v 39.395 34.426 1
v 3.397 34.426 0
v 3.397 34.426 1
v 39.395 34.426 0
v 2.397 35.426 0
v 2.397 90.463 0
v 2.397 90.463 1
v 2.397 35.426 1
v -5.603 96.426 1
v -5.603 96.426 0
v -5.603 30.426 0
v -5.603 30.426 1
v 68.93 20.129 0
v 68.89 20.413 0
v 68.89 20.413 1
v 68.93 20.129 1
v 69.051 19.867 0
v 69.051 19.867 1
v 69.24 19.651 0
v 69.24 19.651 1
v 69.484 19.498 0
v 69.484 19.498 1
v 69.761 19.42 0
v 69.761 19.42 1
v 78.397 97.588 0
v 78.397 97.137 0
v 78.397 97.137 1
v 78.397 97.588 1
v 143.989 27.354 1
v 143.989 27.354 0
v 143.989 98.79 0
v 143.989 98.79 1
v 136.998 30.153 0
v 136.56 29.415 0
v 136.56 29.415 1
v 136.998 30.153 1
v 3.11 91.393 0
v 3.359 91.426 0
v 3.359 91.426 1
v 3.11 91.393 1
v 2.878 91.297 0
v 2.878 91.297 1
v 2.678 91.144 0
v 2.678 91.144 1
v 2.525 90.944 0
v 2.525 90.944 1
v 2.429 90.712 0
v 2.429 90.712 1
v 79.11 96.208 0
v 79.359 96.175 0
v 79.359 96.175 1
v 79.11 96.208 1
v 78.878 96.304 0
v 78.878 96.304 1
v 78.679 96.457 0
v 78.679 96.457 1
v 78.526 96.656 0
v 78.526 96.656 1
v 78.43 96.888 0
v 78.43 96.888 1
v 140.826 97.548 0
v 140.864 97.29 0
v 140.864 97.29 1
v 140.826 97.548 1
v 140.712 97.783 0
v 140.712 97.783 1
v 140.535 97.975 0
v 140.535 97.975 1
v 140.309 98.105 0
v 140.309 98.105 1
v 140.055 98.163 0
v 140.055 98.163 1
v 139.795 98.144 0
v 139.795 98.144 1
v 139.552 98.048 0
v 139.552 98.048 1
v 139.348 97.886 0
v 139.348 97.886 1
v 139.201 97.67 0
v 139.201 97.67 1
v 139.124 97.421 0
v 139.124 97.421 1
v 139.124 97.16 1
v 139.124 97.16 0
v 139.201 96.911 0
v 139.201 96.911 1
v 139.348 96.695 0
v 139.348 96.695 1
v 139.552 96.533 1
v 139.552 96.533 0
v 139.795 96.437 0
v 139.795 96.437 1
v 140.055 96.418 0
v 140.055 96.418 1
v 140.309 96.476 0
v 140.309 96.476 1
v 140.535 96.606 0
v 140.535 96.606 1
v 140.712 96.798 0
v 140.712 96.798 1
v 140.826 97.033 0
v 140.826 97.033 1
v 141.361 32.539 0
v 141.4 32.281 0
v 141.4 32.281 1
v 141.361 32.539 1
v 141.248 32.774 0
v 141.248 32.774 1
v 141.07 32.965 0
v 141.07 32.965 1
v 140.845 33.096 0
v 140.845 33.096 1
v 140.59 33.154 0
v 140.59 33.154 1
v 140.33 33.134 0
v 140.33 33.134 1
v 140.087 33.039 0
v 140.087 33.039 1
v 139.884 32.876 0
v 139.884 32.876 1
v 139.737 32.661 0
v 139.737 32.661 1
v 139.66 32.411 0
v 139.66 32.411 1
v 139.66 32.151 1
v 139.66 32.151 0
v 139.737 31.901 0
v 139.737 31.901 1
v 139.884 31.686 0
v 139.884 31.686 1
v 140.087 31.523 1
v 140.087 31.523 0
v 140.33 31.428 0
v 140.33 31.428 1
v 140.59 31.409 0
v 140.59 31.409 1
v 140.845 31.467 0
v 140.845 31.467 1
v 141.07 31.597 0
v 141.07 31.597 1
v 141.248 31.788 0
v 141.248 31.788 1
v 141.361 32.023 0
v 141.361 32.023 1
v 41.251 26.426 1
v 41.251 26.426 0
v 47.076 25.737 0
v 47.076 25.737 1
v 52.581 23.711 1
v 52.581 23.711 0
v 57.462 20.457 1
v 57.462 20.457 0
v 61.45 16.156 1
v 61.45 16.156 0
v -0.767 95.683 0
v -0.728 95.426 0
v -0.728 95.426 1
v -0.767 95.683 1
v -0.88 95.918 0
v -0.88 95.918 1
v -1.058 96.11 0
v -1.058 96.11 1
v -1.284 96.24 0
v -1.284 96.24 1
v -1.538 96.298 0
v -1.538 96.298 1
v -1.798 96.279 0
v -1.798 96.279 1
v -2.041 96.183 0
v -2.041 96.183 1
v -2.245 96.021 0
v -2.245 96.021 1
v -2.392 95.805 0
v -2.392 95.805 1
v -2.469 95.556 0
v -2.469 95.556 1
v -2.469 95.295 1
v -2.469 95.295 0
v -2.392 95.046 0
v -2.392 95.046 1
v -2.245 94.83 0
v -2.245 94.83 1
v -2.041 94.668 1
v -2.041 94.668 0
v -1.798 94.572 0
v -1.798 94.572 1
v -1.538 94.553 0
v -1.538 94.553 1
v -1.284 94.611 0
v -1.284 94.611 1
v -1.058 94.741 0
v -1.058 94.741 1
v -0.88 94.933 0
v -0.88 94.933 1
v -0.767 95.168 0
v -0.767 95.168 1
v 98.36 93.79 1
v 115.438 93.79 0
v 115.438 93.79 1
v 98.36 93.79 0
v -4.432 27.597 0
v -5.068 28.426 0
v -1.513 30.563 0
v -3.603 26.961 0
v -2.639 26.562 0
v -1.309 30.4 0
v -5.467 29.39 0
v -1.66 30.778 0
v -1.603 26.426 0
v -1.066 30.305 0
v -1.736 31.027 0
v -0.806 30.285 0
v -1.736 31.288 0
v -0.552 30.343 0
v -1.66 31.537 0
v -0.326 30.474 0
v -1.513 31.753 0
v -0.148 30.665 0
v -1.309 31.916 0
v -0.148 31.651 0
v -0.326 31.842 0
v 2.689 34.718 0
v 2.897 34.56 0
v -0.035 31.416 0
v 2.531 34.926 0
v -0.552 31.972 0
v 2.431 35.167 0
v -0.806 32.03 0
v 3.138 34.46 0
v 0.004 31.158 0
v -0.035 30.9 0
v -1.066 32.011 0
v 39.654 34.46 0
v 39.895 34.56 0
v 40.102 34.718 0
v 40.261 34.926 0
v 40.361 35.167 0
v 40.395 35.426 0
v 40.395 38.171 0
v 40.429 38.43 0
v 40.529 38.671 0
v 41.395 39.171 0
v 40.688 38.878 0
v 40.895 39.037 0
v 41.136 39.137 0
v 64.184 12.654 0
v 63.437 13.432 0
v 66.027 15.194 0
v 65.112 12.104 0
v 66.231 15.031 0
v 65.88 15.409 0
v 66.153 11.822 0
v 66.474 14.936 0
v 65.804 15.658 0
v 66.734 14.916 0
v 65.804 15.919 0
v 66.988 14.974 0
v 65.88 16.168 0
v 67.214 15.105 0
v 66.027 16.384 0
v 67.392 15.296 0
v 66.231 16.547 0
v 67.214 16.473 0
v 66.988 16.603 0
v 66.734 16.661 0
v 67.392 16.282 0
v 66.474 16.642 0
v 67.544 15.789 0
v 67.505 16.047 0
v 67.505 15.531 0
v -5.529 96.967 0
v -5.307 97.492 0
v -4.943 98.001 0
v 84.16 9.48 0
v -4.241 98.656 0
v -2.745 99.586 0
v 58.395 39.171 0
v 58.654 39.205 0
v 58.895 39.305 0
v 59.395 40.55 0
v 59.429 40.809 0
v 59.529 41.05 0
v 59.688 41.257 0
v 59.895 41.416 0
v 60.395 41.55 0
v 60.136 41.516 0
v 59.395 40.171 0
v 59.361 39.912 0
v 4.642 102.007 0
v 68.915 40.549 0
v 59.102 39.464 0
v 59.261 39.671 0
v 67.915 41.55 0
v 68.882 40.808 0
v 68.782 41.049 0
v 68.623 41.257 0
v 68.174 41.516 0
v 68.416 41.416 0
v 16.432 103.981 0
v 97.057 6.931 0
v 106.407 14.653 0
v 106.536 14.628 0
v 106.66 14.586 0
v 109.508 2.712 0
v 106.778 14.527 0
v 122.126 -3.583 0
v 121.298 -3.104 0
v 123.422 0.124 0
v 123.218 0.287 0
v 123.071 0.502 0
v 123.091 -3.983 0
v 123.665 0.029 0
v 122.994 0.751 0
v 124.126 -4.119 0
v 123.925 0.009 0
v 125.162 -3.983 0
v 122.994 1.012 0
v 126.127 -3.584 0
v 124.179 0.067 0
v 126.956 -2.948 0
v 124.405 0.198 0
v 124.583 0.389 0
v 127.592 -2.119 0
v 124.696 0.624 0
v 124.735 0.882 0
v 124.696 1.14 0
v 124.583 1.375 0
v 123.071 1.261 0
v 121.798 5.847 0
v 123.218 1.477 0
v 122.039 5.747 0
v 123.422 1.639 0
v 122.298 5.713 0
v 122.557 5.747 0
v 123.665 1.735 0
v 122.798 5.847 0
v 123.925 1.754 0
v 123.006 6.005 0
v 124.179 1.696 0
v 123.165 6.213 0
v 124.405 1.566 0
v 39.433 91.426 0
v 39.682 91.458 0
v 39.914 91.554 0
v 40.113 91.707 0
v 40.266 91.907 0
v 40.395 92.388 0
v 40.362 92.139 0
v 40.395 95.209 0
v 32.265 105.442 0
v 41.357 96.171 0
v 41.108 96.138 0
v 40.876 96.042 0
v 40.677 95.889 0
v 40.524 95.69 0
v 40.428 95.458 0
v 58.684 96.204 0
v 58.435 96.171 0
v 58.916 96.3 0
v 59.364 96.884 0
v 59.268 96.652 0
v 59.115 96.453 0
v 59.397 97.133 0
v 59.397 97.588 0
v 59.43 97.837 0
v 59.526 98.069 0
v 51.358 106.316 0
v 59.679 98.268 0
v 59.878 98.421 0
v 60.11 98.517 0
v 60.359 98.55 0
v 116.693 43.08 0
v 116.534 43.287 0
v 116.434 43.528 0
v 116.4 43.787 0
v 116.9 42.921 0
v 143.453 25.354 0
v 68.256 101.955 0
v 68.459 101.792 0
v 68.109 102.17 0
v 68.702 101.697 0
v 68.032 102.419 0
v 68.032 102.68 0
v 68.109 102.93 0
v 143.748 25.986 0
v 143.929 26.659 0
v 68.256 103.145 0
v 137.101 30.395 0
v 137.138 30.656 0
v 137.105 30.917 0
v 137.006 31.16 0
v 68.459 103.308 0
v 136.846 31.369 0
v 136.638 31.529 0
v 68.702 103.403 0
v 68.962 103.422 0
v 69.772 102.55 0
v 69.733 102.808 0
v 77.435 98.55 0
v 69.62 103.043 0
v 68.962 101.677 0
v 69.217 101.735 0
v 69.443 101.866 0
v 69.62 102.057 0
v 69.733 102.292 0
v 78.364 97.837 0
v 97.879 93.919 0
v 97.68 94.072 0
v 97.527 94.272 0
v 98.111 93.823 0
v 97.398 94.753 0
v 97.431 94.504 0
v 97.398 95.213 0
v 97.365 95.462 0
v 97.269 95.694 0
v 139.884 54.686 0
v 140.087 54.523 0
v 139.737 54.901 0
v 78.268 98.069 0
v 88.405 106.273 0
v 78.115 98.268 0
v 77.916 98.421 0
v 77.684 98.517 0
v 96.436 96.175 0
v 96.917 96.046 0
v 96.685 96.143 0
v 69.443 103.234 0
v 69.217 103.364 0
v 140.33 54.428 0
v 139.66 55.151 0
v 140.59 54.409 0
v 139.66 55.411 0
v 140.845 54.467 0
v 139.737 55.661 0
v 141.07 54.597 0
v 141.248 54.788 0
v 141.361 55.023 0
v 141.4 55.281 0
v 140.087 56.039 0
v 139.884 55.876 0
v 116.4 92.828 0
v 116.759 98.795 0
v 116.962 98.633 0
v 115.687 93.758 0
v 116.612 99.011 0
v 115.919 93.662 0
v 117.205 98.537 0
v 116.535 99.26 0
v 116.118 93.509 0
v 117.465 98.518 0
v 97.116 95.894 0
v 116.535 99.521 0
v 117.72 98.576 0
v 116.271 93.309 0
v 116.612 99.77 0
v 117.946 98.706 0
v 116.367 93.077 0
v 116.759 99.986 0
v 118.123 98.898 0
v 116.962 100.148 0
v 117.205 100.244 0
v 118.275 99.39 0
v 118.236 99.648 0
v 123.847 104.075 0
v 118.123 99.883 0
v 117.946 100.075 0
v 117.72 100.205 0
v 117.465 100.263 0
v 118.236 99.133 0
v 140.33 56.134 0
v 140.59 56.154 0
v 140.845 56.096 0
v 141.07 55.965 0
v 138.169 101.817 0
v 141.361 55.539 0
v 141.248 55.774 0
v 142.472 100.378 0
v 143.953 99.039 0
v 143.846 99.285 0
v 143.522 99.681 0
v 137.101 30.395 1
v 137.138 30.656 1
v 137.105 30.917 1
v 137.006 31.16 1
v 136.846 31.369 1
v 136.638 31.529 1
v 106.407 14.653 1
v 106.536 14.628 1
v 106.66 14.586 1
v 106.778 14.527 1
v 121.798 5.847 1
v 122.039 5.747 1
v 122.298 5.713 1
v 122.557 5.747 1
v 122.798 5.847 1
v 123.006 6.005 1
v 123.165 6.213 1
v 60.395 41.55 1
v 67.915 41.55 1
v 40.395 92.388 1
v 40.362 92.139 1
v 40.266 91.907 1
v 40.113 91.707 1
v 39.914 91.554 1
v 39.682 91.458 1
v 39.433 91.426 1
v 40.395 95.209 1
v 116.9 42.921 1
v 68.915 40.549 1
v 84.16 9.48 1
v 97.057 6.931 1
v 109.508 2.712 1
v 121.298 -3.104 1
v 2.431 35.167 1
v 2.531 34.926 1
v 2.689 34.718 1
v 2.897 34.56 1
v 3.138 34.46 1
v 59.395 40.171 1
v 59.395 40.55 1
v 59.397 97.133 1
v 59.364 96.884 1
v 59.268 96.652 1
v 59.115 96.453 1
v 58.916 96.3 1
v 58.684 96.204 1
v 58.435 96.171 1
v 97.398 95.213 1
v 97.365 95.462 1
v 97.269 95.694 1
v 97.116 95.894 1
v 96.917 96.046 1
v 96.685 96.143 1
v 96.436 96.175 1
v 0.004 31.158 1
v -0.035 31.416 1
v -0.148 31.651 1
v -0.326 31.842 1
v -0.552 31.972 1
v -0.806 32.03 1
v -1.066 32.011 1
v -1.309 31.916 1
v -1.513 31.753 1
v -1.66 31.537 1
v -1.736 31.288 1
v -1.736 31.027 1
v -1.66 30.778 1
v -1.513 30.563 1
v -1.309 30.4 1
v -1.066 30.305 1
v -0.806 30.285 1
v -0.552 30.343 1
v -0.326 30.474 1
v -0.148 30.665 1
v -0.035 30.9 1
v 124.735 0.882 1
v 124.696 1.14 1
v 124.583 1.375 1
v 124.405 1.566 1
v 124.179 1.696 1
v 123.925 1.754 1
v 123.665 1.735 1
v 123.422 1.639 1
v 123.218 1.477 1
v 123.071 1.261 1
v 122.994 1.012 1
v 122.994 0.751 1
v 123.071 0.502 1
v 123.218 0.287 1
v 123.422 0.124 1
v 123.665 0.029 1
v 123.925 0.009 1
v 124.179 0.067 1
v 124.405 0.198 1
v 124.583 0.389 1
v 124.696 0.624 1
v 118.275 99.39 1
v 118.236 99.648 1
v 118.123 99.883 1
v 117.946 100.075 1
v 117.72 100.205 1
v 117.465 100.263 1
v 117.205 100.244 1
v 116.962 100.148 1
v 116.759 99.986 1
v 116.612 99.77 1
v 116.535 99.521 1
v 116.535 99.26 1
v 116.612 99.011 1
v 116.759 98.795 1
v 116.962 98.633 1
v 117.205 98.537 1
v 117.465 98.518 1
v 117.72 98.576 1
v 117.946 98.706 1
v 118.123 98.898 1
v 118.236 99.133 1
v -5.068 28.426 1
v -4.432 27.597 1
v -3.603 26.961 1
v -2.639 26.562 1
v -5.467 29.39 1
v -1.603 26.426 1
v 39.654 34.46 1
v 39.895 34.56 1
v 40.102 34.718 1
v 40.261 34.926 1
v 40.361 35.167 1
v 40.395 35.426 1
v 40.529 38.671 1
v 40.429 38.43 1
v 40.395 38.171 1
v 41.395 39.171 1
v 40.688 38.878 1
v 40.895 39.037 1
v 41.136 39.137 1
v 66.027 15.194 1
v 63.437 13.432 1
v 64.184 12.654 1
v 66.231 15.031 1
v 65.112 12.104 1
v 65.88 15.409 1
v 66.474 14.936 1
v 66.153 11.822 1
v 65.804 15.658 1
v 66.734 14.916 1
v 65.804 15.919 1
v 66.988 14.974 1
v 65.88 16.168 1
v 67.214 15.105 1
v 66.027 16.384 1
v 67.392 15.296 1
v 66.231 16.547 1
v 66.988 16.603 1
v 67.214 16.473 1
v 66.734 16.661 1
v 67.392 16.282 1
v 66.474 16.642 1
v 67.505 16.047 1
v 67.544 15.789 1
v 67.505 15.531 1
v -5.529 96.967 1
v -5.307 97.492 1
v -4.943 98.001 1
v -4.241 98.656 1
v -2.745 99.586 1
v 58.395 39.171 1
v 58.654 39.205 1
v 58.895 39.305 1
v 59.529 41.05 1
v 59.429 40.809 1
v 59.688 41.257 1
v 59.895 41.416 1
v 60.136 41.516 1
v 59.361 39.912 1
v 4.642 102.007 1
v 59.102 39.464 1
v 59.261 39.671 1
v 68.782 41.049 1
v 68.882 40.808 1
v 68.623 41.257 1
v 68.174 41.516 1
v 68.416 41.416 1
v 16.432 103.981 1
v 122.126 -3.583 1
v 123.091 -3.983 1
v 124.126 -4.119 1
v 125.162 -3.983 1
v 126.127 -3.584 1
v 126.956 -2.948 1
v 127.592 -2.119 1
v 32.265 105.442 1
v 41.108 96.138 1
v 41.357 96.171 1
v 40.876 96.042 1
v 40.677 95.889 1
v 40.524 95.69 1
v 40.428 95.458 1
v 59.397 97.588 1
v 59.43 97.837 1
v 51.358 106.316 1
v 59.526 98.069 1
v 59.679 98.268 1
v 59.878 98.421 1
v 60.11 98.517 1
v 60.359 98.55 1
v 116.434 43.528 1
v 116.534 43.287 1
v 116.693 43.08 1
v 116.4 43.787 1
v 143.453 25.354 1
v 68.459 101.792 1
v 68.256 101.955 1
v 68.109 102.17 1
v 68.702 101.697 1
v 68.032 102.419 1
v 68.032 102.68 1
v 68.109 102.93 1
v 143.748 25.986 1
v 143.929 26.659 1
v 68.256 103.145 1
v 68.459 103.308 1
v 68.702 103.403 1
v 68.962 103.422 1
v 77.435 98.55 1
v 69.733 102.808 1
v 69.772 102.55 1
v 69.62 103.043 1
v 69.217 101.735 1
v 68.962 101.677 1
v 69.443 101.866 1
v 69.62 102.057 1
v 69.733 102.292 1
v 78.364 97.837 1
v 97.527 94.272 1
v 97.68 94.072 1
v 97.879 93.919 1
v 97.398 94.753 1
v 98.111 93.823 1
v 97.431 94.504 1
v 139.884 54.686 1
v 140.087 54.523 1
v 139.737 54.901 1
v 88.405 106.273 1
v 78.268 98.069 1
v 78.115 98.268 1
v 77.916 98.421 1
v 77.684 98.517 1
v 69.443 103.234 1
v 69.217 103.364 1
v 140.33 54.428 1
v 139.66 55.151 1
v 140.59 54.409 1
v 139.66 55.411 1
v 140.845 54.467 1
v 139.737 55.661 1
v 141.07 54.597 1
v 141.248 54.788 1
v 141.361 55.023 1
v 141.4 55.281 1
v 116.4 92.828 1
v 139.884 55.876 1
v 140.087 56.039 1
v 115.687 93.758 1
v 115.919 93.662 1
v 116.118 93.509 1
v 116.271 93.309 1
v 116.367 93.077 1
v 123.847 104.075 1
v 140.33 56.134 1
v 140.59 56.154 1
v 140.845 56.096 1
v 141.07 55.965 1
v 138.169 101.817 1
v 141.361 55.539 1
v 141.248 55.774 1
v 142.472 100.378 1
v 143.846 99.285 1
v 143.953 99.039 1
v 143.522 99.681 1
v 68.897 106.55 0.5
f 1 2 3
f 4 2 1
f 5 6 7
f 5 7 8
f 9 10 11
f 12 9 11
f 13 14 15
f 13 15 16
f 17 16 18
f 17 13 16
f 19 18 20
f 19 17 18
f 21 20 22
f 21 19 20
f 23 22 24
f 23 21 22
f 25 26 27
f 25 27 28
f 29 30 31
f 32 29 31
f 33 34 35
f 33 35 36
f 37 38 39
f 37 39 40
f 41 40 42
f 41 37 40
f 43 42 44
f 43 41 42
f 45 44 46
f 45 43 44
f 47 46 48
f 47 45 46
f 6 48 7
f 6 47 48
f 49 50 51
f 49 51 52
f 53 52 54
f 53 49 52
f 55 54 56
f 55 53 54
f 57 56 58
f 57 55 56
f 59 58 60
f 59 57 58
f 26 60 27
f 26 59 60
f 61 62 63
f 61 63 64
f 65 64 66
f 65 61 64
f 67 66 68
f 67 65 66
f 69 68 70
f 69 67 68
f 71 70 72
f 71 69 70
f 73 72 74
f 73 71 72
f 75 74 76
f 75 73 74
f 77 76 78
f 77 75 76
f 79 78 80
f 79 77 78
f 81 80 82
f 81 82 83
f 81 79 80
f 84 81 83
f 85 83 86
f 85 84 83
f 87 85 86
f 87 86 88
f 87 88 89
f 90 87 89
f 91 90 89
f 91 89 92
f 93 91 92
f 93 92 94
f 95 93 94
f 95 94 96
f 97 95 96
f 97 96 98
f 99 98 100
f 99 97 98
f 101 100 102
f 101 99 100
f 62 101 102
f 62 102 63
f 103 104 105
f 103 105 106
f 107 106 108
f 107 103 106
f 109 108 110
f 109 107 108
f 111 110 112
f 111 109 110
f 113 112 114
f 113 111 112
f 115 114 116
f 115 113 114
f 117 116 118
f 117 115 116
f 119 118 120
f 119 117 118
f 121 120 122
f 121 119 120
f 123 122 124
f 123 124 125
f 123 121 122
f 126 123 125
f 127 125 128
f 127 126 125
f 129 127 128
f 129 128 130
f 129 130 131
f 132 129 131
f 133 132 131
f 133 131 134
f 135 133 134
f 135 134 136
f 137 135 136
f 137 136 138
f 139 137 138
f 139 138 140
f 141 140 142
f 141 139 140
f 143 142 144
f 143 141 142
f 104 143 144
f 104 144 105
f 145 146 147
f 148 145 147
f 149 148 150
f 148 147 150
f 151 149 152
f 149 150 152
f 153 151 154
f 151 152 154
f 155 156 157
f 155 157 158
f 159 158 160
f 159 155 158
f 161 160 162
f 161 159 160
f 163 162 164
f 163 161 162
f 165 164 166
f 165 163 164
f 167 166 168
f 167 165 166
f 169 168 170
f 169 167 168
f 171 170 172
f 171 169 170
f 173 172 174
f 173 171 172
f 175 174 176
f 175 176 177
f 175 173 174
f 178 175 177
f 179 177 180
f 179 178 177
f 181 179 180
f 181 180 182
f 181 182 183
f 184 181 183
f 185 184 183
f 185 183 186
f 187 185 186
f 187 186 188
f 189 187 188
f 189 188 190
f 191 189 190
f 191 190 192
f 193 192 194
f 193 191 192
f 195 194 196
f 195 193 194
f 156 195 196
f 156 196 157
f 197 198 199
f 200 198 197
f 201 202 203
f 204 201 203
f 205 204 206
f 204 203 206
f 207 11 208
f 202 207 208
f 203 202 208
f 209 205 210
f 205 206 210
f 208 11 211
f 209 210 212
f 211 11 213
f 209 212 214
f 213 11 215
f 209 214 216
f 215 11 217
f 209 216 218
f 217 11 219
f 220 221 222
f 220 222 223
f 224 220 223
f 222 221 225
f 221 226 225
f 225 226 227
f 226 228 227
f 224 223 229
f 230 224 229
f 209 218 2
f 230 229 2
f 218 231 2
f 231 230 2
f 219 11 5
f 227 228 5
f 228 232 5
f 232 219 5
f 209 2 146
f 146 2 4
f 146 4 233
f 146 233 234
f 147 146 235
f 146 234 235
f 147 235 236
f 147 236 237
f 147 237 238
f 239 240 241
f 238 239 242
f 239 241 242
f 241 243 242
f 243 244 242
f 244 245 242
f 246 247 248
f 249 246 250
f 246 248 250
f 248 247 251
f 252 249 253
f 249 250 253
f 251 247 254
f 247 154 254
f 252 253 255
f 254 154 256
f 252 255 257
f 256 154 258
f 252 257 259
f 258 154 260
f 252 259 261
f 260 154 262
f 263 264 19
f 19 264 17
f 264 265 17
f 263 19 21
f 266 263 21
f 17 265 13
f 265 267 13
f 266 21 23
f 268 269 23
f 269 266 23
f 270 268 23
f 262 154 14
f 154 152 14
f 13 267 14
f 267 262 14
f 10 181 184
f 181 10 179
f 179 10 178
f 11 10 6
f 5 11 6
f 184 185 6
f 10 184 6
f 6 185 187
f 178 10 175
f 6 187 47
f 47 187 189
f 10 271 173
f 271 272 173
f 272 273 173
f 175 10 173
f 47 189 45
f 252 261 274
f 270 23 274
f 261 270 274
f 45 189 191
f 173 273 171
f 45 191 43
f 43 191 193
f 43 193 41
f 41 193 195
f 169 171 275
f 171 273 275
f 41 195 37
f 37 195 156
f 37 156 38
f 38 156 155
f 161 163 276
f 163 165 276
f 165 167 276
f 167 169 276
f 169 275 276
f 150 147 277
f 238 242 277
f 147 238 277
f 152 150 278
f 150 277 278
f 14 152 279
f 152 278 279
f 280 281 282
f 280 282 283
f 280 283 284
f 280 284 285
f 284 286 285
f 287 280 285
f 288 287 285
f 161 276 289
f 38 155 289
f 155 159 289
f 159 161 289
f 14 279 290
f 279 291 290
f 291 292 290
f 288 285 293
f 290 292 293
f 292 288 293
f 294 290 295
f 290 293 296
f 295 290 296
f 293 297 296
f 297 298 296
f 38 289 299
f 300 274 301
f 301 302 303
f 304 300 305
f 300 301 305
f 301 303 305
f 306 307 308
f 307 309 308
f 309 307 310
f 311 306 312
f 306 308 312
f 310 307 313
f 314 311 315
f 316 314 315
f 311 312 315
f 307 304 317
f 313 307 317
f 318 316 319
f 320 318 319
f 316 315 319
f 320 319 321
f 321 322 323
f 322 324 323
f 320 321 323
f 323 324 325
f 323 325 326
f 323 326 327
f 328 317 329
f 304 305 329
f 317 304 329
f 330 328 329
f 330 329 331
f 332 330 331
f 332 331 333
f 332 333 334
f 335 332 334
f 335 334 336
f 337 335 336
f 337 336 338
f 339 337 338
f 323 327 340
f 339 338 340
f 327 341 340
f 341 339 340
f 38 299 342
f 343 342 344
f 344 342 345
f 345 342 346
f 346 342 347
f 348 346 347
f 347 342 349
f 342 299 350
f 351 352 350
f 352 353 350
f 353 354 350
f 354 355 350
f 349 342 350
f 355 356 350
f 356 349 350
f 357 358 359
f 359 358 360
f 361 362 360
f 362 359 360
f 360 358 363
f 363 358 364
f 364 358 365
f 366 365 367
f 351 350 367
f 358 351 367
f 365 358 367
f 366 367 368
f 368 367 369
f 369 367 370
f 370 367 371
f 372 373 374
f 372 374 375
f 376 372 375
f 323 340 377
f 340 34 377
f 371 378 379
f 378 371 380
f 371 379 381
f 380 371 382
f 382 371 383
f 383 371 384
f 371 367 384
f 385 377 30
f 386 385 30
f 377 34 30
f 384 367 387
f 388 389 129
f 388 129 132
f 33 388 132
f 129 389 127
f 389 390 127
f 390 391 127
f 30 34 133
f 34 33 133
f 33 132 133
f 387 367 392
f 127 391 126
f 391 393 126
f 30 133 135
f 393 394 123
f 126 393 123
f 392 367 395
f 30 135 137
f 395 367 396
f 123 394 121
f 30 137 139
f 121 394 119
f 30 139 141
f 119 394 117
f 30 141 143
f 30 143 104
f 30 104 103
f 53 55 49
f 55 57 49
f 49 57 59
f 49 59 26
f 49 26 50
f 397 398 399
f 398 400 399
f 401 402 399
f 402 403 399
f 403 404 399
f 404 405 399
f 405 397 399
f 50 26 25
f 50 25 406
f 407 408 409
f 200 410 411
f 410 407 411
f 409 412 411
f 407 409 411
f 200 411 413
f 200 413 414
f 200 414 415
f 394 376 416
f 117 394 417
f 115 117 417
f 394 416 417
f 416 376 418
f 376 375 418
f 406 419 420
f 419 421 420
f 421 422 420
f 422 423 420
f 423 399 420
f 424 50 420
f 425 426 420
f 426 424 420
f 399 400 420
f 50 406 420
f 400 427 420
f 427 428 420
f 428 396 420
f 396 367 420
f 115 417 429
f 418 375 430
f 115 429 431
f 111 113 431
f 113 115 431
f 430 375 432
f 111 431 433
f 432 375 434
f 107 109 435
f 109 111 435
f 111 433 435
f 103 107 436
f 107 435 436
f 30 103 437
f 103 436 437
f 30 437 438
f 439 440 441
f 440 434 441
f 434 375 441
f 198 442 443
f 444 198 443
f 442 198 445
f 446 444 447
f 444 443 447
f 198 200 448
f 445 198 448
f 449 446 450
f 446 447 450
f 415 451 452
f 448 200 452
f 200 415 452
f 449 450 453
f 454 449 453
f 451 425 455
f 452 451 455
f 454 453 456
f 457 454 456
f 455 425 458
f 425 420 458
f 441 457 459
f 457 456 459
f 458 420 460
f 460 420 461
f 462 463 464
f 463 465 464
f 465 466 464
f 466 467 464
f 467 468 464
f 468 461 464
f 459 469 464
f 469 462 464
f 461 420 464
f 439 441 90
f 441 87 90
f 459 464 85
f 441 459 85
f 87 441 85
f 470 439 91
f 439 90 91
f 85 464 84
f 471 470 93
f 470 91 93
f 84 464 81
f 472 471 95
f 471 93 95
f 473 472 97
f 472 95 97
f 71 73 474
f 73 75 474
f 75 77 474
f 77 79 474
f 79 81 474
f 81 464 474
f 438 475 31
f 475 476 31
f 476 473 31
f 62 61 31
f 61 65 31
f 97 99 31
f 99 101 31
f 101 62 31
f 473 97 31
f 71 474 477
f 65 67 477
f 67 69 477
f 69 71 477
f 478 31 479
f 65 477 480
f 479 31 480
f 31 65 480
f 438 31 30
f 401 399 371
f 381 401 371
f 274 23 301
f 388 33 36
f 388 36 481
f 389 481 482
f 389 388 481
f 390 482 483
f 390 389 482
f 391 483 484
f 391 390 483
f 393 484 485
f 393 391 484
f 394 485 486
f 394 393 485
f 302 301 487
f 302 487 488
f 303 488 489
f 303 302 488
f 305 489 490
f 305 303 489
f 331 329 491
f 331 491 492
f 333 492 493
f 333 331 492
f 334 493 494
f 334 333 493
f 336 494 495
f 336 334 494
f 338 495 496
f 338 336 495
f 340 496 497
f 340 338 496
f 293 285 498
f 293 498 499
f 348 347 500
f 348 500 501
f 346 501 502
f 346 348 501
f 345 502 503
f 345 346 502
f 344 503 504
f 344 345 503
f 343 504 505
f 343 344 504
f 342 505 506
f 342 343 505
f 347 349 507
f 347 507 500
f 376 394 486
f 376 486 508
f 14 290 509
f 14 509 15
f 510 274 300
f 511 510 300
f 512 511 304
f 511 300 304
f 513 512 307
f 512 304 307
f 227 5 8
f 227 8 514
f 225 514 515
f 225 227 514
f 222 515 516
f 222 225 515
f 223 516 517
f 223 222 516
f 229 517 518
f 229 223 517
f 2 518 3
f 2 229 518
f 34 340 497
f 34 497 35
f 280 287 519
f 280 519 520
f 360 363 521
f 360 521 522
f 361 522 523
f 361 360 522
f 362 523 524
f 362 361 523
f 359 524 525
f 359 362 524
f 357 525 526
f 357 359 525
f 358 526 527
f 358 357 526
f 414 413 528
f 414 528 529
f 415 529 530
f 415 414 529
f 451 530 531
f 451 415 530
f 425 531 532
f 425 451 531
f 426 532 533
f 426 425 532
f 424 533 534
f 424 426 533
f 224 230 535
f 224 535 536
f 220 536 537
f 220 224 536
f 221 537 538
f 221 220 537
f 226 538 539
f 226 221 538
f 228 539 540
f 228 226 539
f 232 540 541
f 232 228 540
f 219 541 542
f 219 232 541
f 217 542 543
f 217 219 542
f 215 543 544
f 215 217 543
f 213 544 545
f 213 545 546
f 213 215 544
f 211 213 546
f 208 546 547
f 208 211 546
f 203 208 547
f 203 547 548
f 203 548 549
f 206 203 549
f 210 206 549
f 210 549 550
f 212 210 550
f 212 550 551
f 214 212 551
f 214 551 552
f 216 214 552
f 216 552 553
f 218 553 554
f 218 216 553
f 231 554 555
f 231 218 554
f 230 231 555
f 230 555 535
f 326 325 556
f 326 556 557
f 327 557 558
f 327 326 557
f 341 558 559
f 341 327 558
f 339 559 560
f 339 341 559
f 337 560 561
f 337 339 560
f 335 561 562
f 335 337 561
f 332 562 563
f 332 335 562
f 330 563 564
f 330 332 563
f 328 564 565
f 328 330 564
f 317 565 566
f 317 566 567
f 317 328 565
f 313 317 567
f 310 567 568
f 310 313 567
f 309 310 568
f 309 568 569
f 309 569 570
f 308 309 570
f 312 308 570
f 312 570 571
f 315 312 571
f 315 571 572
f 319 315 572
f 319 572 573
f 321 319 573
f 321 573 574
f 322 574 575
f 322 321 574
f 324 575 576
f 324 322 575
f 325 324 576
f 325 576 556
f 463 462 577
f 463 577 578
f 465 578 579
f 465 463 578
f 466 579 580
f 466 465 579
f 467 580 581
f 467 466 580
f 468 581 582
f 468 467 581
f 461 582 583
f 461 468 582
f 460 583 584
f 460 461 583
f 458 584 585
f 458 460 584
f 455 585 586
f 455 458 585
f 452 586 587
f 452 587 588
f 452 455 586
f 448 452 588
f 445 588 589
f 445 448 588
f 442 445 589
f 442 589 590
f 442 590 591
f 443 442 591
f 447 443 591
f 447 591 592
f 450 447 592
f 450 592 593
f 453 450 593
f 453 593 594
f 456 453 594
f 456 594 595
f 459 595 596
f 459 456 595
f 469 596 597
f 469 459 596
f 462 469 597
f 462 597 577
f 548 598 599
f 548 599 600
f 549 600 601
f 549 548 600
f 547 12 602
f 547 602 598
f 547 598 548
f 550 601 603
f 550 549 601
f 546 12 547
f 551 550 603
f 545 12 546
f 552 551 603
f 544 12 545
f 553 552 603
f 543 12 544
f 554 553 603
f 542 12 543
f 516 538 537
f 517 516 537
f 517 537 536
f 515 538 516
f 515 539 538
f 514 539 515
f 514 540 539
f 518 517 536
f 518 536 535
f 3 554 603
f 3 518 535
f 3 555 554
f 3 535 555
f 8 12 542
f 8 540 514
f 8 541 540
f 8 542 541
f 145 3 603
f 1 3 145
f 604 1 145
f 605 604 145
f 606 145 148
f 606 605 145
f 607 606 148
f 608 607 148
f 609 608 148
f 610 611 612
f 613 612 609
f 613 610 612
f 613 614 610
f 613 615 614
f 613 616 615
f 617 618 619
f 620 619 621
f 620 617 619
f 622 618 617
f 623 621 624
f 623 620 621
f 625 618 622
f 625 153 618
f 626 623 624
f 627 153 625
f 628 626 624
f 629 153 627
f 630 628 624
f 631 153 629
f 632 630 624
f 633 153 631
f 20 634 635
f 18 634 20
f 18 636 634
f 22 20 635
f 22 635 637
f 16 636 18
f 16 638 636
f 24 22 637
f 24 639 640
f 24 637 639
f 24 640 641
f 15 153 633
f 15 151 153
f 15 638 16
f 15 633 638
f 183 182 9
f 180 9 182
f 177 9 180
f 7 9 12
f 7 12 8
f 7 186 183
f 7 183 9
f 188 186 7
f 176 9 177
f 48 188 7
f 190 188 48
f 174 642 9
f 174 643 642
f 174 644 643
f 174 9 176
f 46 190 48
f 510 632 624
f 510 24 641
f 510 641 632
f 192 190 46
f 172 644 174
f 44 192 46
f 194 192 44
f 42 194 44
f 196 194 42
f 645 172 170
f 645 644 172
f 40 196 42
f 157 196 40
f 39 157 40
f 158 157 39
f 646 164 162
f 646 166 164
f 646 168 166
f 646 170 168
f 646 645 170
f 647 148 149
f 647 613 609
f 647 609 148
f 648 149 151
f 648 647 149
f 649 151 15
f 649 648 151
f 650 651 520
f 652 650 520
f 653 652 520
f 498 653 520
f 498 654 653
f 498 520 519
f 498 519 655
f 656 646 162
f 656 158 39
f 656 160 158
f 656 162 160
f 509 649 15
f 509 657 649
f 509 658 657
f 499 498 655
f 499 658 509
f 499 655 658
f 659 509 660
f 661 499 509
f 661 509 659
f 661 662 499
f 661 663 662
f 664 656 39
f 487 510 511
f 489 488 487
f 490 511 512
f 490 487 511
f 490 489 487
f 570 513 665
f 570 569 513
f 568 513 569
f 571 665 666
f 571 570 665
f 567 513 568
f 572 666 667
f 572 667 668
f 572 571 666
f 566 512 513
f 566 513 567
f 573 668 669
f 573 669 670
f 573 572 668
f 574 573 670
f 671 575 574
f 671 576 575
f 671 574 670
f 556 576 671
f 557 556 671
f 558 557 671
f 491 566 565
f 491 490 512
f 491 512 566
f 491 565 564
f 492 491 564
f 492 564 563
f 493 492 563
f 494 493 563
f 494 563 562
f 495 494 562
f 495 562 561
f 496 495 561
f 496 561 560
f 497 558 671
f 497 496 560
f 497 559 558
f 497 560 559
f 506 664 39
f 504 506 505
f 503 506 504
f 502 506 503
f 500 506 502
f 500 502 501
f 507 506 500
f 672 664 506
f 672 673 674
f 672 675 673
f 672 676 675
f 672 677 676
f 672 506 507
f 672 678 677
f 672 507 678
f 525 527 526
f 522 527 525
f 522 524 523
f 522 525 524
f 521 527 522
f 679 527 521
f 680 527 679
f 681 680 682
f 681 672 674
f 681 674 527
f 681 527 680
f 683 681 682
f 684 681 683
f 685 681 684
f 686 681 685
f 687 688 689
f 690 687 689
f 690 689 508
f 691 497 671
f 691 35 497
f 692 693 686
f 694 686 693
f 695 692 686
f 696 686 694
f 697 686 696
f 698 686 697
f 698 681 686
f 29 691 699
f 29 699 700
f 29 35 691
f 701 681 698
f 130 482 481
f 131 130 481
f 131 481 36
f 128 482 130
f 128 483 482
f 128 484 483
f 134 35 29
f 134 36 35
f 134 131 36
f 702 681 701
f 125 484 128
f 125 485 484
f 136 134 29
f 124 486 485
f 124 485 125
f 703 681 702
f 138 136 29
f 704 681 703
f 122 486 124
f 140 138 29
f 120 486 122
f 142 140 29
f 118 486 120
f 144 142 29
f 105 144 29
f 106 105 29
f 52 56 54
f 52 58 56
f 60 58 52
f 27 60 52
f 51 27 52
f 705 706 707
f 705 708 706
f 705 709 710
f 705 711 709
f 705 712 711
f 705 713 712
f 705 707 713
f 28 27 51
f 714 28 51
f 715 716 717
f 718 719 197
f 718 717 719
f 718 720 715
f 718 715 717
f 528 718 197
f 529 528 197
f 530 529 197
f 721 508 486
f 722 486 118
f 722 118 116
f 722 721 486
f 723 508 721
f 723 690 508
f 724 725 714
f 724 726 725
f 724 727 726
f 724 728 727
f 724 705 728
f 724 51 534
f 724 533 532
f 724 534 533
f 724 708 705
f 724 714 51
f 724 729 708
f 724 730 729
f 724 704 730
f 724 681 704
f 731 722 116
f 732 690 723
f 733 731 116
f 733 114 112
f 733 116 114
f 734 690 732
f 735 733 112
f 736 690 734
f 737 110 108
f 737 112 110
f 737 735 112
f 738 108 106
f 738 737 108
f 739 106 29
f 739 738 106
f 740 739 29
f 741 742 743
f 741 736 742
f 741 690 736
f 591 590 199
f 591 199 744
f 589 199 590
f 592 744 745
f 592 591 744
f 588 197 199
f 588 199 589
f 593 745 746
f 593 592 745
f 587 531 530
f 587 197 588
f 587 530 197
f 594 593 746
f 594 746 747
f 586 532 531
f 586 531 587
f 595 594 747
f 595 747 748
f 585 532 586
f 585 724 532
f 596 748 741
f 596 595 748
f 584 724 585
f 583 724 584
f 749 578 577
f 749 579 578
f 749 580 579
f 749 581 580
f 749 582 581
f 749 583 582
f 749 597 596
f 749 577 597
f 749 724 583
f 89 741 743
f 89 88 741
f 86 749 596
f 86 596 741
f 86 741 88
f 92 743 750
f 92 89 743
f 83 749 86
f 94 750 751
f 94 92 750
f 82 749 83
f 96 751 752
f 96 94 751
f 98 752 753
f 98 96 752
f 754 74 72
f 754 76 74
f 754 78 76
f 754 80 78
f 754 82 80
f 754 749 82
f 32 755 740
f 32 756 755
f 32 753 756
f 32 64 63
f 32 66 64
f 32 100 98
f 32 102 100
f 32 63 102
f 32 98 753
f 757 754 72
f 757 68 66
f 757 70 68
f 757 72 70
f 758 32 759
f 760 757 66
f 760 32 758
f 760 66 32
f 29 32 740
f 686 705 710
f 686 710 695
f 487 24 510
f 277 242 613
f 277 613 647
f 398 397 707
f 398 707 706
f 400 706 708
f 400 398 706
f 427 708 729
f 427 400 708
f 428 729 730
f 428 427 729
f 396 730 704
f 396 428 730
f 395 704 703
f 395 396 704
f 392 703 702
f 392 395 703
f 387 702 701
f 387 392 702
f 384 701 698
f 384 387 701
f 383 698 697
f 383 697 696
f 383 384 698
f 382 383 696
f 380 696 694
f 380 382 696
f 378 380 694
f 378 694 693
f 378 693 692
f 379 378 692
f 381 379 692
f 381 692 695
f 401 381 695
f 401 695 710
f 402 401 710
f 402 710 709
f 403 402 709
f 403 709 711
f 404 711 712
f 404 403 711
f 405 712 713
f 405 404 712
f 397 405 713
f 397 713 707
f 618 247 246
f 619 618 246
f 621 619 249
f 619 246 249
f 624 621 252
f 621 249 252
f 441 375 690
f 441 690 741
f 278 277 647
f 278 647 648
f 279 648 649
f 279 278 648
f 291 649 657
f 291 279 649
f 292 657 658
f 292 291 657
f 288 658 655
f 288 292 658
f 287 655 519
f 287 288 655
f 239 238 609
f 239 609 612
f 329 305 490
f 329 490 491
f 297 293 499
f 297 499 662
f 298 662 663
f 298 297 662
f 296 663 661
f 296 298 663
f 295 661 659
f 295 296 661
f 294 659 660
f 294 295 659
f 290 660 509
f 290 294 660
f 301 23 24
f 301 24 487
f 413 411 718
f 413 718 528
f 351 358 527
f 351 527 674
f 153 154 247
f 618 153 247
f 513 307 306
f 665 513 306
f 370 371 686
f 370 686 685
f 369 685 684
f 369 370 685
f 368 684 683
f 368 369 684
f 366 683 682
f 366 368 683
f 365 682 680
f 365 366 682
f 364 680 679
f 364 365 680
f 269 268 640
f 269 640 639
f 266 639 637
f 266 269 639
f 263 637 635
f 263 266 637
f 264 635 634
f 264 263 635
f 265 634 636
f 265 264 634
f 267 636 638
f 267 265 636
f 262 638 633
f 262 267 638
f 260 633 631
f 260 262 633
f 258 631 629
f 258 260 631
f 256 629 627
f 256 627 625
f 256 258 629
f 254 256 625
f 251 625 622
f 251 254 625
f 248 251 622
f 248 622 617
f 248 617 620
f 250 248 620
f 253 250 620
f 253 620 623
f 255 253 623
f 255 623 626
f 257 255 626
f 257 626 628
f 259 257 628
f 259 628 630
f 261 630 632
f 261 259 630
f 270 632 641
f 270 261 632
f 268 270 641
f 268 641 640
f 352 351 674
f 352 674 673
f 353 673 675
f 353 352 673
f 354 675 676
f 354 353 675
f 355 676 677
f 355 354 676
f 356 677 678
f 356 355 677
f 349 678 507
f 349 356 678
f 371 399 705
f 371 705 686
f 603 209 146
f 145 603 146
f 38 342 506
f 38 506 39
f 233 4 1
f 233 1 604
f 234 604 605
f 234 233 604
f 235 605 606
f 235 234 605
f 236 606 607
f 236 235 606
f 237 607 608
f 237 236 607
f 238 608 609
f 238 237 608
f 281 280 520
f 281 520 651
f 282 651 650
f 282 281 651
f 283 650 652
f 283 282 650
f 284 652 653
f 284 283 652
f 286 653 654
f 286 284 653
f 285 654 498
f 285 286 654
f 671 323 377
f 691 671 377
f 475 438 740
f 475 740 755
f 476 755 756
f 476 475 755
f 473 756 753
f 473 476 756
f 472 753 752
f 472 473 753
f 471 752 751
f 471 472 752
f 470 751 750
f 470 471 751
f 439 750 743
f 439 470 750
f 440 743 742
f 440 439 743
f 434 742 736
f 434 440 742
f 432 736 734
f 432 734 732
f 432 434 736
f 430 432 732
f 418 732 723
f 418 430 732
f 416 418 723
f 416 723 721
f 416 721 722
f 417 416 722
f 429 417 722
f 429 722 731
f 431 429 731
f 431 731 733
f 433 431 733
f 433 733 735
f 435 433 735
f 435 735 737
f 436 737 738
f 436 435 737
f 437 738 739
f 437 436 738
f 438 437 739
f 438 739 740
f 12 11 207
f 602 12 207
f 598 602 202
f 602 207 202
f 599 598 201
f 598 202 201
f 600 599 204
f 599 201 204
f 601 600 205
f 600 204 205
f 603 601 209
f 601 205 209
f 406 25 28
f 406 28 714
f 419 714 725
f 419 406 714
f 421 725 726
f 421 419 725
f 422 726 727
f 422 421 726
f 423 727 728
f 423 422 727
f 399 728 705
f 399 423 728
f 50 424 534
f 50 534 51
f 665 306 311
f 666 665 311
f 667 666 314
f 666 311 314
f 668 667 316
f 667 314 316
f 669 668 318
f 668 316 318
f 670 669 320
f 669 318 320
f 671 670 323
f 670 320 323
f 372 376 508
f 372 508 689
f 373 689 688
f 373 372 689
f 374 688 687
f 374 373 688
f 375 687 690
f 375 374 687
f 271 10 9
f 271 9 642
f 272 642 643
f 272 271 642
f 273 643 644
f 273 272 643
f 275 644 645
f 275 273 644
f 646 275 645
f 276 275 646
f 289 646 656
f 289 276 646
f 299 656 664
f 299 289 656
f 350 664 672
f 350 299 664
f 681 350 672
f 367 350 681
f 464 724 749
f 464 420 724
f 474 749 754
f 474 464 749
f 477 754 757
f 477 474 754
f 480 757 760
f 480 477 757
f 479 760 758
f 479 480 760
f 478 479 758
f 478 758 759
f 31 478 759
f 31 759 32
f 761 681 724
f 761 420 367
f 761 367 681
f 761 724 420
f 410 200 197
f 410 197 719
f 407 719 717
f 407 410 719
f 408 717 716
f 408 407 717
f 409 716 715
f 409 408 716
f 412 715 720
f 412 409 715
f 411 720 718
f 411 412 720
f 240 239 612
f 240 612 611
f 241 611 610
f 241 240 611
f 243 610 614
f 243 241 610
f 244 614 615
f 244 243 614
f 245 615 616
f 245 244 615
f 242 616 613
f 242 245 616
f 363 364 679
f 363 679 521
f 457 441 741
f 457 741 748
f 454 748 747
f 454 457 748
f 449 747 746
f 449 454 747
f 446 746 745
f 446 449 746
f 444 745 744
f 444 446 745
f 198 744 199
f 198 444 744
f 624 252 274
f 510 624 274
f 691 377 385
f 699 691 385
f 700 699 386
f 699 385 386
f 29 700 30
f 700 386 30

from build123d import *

# Parameters (mm, degrees)
SKETCH2_R           = 0.875
BOSS_EXTRUDE1_DEPTH = 1


with BuildPart() as part:
    # Sketch2 → Boss-Extrude1 (new body)
    with BuildSketch(Plane.XY):
        with BuildLine():
            Line((-5.603408365, 96.42556159), (-5.603408365, 30.425568858))
            ThreePointArc((-5.603408365, 30.425568858), (-4.43183549, 27.597141733), (-1.603408365, 26.425568858))
            Line((-1.603408365, 26.425568858), (41.250894393, 26.425568858))
            ThreePointArc((41.250894393, 26.425568858), (52.580802046, 23.710837368), (61.450097132, 16.156224264))
            Line((61.450097132, 16.156224264), (63.436905361, 13.431841599))
            ThreePointArc((63.436905361, 13.431841599), (64.629324911, 12.347724535), (66.15279536, 11.822165805))
            Line((66.15279536, 11.822165805), (84.159730921, 9.479779923))
            ThreePointArc((84.159730921, 9.479779923), (103.351530482, 5.02611066), (121.297670701, -3.103858071))
            Line((121.297670701, -3.103858071), (122.126093986, -3.582626958))
            ThreePointArc((122.126093986, -3.582626958), (125.162033535, -3.98331921), (127.591695632, -2.119391819))
            Line((127.591695632, -2.119391819), (143.453487011, 25.354036748))
            ThreePointArc((143.453487011, 25.354036748), (143.853088701, 26.318760568), (143.989385396, 27.354036748))
            Line((143.989385396, 27.354036748), (143.989385396, 98.790469349))
            add(Edge.make_bspline(
                [(-5.603408365, 96.42556159), (-5.603408365, 103.460733083), (68.627157279, 109.640132521), (143.989385396, 103.458567417), (143.989385396, 98.790469349)],
                knots=[0, 0, 0, 0, 0.499912399, 1, 1, 1, 1], degree=3))
        make_face()
        with Locations((123.859596668, 0.88165491)):
            Circle(SKETCH2_R, mode=Mode.SUBTRACT)
        with Locations((140.524945013, 32.281066453)):
            Circle(SKETCH2_R, mode=Mode.SUBTRACT)
        with Locations((140.524945013, 55.281066453)):
            Circle(SKETCH2_R, mode=Mode.SUBTRACT)
        with Locations((139.989385396, 97.290469349)):
            Circle(SKETCH2_R, mode=Mode.SUBTRACT)
        with Locations((117.399952063, 99.390469349)):
            Circle(SKETCH2_R, mode=Mode.SUBTRACT)
        with Locations((68.896968427, 102.54989148)):
            Circle(SKETCH2_R, mode=Mode.SUBTRACT)
        with Locations((-1.603408365, 95.42556159)):
            Circle(SKETCH2_R, mode=Mode.SUBTRACT)
        with Locations((-0.871175318, 31.157801905)):
            Circle(SKETCH2_R, mode=Mode.SUBTRACT)
        with Locations((66.6687778, 15.788746464)):
            Circle(SKETCH2_R, mode=Mode.SUBTRACT)
        with BuildLine():
            Line((2.396591635, 90.463437274), (2.396591635, 35.425568858))
            ThreePointArc((2.396591635, 35.425568858), (2.689484854, 34.718462076), (3.396591635, 34.425568858))
            Line((3.396591635, 34.425568858), (39.394762972, 34.425568858))
            ThreePointArc((39.394762972, 34.425568858), (40.101869753, 34.718462076), (40.394762972, 35.425568858))
            Line((40.394762972, 35.425568858), (40.394762972, 38.171054802))
            ThreePointArc((40.394762972, 38.171054802), (40.687656191, 38.878161583), (41.394762972, 39.171054802))
            Line((41.394762972, 39.171054802), (58.395031929, 39.171054802))
            ThreePointArc((58.395031929, 39.171054802), (59.10213871, 39.463948021), (59.395031929, 40.171054802))
            Line((59.395031929, 40.171054802), (59.395031929, 40.549898748))
            ThreePointArc((59.395031929, 40.549898748), (59.687925148, 41.257005529), (60.395031929, 41.549898748))
            Line((60.395031929, 41.549898748), (67.915303846, 41.549898748))
            ThreePointArc((67.915303846, 41.549898748), (68.622863481, 41.256552384), (68.915303025, 40.548617472))
            Line((68.915303025, 40.548617472), (68.889503983, 20.413194101))
            ThreePointArc((68.889503983, 20.413194101), (69.137749853, 19.75246839), (69.760507552, 19.420267661))
            Line((69.760507552, 19.420267661), (106.406539112, 14.653262932))
            ThreePointArc((106.406539112, 14.653262932), (106.598457108, 14.608726239), (106.77791851, 14.527426552))
            Line((106.77791851, 14.527426552), (121.798174914, 5.846802094))
            ThreePointArc((121.798174914, 5.846802094), (122.557159801, 5.746629031), (123.164575325, 6.212610879))
            Line((123.164575325, 6.212610879), (136.560419931, 29.414894346))
            Line((136.560419931, 29.414894346), (136.998243059, 30.153322469))
            ThreePointArc((136.998243059, 30.153322469), (137.105460539, 30.916626107), (136.637925468, 31.529438468))
            Line((136.637925468, 31.529438468), (116.900098761, 42.920620776))
            ThreePointArc((116.900098761, 42.920620776), (116.533969008, 43.286657516), (116.399952063, 43.78673086))
            Line((116.399952063, 43.78673086), (116.399952063, 92.828345033))
            ThreePointArc((116.399952063, 92.828345033), (116.118152375, 93.508669661), (115.437827746, 93.790469349))
            Line((115.437827746, 93.790469349), (98.360317754, 93.790469349))
            ThreePointArc((98.360317754, 93.790469349), (97.679993126, 94.072269037), (97.398193438, 94.752593666))
            Line((97.398193438, 94.752593666), (97.398193438, 95.213192117))
            ThreePointArc((97.398193438, 95.213192117), (97.11639375, 95.893516746), (96.436069121, 96.175316434))
            Line((96.436069121, 96.175316434), (79.359092742, 96.175316434))
            ThreePointArc((79.359092742, 96.175316434), (78.678768113, 96.457116122), (78.396968425, 97.137440751))
            Line((78.396968425, 97.137440751), (78.396968425, 97.587767164))
            ThreePointArc((78.396968425, 97.587767164), (78.115168737, 98.268091793), (77.434844109, 98.54989148))
            Line((77.434844109, 98.54989148), (60.359092745, 98.54989148))
            ThreePointArc((60.359092745, 98.54989148), (59.678768117, 98.268091793), (59.396968429, 97.587767164))
            Line((59.396968429, 97.587767164), (59.396968429, 97.133171852))
            ThreePointArc((59.396968429, 97.133171852), (59.115168741, 96.452847223), (58.434844112, 96.171047535))
            Line((58.434844112, 96.171047535), (41.357156249, 96.171047535))
            ThreePointArc((41.357156249, 96.171047535), (40.676831621, 95.889247847), (40.395031933, 95.208923218))
            Line((40.395031933, 95.208923218), (40.395031933, 92.387685907))
            ThreePointArc((40.395031933, 92.387685907), (40.113232245, 91.707361278), (39.432907616, 91.42556159))
            Line((39.432907616, 91.42556159), (3.358715952, 91.42556159))
            ThreePointArc((3.358715952, 91.42556159), (2.678391323, 91.143761902), (2.396591635, 90.463437274))
        make_face(mode=Mode.SUBTRACT)
    extrude(amount=BOSS_EXTRUDE1_DEPTH)


solid = part.part
